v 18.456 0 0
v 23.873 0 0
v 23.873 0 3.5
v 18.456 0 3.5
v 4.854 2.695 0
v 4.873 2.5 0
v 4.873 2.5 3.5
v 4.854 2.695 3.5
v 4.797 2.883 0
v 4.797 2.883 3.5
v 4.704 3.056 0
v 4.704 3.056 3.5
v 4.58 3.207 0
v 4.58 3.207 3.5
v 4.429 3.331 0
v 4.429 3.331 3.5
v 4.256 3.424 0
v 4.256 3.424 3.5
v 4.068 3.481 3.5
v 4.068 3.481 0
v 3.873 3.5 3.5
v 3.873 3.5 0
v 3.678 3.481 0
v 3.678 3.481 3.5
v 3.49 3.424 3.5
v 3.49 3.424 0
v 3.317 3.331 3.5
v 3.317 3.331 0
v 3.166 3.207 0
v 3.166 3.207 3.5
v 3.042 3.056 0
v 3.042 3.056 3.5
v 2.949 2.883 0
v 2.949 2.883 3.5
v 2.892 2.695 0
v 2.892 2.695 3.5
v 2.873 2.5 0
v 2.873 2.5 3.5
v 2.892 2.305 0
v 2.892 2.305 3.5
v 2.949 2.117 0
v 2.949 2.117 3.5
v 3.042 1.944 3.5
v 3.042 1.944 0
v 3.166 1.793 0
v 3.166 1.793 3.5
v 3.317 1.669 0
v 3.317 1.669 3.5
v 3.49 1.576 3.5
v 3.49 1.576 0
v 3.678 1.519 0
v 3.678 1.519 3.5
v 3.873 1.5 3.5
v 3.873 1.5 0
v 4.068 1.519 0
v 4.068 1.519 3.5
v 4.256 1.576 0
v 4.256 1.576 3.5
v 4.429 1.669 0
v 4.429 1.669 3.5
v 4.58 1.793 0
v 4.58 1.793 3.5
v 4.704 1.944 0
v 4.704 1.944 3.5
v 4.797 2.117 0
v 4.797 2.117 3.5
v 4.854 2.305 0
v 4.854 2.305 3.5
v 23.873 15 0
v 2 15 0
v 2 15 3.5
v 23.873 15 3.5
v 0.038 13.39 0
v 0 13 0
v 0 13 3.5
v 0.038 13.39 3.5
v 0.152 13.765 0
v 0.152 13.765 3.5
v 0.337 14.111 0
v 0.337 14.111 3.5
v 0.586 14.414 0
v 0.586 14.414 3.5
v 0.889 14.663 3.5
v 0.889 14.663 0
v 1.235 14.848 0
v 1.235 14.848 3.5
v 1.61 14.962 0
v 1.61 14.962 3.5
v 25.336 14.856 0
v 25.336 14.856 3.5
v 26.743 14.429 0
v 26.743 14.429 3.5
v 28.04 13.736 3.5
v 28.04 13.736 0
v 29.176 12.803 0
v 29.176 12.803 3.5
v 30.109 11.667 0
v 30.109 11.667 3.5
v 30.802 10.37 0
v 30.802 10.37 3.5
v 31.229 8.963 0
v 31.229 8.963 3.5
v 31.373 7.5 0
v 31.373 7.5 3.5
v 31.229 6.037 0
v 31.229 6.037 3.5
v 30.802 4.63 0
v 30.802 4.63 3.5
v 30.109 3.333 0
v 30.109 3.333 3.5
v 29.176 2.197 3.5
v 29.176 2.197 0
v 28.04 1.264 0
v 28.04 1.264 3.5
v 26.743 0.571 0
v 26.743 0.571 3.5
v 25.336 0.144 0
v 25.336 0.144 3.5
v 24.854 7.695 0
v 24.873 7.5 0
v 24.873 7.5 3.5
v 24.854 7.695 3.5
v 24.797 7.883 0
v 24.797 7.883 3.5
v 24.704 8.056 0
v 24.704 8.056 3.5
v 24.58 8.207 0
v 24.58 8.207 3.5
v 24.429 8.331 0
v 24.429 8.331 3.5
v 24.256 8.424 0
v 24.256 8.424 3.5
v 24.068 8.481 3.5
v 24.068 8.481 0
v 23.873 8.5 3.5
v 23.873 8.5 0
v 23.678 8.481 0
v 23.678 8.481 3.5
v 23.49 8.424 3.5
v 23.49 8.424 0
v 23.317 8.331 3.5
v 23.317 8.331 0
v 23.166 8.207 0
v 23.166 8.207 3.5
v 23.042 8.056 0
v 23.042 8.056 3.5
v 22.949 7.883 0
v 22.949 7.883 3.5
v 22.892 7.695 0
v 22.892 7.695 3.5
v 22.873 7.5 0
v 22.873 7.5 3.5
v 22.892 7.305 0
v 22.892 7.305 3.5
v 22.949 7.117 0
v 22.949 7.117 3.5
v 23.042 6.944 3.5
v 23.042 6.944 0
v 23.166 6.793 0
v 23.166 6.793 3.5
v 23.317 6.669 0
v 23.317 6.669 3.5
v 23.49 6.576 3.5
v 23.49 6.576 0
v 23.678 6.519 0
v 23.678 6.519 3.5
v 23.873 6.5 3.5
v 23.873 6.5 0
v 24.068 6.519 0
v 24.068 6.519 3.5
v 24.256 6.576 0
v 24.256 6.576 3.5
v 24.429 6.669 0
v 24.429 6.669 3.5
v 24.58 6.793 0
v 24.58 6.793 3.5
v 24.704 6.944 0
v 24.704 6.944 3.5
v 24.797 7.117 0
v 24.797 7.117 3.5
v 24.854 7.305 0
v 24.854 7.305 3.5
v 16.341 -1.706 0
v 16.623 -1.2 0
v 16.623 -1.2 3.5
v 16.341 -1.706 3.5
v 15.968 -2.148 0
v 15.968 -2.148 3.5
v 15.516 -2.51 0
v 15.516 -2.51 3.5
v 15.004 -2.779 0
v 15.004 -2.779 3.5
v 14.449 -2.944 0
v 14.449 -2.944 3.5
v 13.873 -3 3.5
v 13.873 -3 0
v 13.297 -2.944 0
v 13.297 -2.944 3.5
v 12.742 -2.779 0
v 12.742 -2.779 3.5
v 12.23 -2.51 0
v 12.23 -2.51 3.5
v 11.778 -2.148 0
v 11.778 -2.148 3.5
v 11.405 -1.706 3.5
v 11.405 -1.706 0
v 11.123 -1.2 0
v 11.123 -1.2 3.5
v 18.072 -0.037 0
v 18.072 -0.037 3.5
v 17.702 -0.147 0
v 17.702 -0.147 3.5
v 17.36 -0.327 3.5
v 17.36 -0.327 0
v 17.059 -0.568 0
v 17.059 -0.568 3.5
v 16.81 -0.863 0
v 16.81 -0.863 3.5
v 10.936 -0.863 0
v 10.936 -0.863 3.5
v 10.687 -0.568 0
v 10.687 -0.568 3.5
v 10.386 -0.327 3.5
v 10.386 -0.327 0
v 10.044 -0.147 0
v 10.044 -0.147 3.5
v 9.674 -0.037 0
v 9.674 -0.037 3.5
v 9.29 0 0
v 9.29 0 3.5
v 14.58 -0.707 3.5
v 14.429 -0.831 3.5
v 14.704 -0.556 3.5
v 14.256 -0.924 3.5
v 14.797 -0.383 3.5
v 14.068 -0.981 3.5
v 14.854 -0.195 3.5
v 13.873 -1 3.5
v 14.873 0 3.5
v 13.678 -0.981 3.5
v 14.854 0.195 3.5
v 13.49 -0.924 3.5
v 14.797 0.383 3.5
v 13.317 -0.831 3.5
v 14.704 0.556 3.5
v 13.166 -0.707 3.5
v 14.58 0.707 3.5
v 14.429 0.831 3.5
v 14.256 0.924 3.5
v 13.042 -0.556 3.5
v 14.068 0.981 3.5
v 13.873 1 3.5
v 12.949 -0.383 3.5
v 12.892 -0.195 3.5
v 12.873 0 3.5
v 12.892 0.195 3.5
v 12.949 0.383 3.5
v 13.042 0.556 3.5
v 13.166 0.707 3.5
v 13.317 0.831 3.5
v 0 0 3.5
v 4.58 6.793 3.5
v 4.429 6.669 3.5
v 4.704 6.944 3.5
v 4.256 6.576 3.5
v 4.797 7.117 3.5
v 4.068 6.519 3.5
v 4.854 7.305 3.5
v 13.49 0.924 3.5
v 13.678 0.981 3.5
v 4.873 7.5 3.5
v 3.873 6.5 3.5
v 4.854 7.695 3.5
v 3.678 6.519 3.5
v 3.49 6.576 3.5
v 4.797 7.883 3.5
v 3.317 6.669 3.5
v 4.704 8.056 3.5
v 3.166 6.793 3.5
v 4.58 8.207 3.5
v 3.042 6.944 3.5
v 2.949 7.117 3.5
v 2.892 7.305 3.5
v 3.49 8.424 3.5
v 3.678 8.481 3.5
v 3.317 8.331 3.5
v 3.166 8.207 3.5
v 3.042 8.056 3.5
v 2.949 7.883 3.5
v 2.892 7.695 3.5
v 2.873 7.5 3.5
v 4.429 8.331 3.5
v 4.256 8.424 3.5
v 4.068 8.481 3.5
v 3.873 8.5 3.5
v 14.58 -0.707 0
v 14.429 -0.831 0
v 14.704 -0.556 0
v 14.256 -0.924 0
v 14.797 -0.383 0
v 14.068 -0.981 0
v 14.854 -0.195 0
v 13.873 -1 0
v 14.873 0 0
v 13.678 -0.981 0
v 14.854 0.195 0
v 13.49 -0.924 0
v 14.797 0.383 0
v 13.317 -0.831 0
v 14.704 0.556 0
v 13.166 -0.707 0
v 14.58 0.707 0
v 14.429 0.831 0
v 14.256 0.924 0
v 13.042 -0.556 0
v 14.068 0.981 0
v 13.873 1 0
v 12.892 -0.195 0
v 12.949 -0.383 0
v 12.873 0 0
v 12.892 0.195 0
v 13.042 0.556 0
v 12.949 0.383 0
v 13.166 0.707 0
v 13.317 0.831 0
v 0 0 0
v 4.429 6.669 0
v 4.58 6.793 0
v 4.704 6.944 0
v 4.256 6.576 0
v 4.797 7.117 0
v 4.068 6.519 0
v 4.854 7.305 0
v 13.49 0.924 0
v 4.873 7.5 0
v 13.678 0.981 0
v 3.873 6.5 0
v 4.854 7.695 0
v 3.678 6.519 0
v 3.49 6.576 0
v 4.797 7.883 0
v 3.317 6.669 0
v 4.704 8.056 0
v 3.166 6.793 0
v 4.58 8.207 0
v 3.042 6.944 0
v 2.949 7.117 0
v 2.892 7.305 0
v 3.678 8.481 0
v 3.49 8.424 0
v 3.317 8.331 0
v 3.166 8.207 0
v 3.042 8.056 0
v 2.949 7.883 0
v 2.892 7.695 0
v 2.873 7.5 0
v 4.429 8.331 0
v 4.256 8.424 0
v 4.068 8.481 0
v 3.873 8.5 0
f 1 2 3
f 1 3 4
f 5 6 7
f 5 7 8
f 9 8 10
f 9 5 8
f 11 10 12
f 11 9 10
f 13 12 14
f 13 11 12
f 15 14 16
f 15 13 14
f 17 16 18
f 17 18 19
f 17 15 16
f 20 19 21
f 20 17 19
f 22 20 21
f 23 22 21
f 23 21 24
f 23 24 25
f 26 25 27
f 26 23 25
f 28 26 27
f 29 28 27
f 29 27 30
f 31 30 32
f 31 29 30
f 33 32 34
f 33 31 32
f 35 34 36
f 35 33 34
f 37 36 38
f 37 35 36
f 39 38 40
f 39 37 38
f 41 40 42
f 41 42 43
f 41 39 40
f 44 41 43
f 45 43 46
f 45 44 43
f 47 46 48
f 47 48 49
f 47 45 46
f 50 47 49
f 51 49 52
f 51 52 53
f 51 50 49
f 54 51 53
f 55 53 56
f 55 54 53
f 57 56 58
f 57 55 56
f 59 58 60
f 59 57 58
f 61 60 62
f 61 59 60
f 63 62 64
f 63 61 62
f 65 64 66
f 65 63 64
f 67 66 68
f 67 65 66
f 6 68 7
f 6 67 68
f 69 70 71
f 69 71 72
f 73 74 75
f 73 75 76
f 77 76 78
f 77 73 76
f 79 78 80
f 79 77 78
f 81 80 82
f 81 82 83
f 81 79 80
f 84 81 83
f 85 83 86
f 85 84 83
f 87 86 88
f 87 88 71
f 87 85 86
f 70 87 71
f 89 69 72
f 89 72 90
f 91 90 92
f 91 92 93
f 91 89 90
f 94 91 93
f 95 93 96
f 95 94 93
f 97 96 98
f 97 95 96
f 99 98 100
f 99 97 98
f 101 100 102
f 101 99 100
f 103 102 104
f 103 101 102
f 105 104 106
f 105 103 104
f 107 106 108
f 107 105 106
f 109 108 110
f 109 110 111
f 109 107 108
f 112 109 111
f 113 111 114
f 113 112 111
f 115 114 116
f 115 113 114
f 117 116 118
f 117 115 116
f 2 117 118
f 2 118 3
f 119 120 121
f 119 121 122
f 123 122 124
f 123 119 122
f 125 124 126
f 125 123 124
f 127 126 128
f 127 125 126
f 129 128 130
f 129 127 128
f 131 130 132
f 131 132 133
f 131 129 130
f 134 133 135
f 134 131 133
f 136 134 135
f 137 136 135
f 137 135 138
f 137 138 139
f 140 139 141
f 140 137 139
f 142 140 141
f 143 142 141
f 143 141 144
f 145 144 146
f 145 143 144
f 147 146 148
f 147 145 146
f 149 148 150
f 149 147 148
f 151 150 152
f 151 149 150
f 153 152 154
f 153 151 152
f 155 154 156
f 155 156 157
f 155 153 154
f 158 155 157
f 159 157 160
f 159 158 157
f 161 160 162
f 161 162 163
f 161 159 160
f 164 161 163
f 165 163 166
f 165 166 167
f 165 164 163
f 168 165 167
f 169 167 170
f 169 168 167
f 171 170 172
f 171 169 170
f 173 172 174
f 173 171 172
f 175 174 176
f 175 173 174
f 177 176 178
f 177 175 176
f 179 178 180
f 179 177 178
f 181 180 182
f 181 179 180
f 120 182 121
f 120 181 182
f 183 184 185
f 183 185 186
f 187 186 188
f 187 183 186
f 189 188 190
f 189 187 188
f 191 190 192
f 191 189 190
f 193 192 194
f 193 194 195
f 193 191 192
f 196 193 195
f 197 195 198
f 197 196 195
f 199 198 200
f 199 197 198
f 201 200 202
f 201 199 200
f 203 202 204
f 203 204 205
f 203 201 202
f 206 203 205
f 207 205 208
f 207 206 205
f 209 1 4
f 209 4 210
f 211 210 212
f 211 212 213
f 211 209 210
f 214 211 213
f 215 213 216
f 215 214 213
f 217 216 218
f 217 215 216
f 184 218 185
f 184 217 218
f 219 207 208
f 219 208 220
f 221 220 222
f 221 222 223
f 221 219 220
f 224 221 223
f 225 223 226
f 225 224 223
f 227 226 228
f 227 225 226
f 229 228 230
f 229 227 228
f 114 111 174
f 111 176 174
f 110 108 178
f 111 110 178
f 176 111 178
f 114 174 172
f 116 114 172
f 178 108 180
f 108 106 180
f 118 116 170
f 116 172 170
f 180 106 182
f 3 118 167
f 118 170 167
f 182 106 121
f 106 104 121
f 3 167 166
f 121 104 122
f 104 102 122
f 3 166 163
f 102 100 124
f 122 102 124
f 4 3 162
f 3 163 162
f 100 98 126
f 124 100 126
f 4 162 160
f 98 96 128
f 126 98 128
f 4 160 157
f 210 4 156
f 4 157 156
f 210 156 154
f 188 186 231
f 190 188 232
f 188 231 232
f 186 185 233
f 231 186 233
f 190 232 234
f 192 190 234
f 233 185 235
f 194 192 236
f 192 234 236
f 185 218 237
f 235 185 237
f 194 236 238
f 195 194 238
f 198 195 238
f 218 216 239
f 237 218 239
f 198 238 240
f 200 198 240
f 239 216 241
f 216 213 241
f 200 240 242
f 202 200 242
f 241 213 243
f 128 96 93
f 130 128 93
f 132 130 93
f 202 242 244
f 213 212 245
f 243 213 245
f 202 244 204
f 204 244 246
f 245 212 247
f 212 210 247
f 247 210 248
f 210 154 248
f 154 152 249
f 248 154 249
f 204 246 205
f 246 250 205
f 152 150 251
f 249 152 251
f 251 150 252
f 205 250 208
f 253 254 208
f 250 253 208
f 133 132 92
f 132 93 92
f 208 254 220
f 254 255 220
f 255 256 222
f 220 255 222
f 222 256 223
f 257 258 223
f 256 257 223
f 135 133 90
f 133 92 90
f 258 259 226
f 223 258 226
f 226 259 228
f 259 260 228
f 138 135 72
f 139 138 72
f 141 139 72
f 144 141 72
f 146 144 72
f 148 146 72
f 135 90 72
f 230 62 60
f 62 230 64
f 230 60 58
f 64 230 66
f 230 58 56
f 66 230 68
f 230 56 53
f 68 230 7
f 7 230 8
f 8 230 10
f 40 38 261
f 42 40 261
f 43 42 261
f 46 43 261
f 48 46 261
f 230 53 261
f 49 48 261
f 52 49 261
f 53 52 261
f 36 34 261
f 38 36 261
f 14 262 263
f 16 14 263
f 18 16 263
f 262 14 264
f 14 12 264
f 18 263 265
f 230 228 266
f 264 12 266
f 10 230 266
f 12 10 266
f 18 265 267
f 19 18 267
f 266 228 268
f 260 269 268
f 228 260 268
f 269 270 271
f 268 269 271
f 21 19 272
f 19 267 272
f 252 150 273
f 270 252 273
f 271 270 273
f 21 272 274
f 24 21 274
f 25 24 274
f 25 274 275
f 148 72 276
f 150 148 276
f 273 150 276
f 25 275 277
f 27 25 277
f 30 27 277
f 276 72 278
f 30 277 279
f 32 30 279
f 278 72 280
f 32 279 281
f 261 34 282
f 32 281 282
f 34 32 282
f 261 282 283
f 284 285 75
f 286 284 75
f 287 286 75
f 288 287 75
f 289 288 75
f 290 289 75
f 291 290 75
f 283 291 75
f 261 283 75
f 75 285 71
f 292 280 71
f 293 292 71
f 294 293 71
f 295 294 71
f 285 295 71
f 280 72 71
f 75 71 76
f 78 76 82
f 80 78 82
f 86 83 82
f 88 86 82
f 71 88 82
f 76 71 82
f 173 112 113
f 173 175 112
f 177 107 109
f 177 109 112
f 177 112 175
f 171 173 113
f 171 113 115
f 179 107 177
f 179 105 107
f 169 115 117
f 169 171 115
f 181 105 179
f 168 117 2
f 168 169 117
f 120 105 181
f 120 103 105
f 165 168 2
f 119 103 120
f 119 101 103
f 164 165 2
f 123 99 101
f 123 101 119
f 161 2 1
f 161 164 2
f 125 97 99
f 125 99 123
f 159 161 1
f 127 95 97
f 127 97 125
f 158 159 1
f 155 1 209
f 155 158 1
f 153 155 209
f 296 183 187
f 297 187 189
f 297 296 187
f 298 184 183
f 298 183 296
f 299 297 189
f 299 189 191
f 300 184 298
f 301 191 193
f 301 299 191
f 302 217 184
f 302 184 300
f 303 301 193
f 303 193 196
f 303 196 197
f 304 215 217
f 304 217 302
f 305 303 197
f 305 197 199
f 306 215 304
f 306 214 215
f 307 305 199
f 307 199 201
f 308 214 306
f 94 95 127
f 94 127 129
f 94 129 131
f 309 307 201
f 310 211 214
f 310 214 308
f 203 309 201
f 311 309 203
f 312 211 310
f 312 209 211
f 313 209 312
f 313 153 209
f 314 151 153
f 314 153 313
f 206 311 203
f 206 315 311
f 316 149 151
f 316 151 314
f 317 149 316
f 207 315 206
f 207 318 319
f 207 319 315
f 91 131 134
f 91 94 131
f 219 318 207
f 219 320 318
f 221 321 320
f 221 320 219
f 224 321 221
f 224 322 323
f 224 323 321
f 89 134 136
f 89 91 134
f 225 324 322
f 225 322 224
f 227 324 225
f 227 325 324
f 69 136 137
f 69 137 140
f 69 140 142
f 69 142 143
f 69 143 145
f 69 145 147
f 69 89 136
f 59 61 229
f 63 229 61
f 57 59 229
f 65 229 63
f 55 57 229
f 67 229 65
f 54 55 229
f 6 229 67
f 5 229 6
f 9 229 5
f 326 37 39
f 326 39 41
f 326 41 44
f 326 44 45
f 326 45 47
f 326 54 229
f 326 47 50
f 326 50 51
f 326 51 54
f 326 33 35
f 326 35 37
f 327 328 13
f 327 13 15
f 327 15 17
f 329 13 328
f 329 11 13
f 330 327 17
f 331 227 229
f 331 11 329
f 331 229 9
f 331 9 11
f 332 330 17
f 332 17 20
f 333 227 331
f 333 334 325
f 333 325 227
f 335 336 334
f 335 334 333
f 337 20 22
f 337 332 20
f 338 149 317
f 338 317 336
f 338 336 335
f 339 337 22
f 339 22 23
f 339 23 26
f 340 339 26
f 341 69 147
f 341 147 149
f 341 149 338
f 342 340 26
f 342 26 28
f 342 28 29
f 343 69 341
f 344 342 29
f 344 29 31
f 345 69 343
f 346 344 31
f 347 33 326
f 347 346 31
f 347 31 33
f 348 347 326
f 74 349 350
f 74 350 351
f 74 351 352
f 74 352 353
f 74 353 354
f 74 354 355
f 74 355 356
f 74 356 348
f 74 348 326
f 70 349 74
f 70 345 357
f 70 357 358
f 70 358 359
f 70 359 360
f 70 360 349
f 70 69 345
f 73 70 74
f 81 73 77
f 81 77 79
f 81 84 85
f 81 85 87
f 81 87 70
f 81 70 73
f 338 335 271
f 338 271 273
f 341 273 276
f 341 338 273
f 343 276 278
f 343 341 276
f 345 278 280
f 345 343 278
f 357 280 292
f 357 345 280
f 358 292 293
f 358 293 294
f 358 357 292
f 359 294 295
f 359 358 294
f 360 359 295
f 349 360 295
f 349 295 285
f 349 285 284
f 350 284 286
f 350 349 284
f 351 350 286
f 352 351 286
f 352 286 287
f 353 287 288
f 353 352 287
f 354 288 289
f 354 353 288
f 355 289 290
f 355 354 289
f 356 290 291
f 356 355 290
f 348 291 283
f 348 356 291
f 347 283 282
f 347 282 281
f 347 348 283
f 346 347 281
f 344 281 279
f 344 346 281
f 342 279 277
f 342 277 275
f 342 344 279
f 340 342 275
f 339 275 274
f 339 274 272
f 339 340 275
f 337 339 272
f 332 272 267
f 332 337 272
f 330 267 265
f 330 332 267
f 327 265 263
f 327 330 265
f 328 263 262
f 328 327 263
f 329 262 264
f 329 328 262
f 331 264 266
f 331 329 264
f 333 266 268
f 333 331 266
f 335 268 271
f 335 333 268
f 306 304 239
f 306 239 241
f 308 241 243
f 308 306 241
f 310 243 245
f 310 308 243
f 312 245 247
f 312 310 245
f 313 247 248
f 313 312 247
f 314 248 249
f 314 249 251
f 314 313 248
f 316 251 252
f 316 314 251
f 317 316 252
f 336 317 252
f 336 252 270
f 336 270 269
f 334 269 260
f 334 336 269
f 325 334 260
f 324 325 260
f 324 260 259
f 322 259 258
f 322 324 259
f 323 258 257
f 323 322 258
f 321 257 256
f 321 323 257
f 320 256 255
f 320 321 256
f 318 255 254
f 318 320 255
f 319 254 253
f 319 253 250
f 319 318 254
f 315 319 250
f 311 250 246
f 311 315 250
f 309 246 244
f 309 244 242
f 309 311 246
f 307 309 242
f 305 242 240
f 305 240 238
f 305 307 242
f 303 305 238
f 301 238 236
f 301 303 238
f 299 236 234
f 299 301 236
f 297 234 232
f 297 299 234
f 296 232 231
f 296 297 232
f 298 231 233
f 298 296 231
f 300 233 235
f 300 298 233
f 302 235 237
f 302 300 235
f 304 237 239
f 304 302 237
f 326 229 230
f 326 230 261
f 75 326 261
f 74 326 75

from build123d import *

# Parameters (mm, degrees)
SKETCH1_R           = 1
BOSS_EXTRUDE1_DEPTH = 3.5


with BuildPart() as part:
    # Sketch1 → Boss-Extrude1 (new body)
    with BuildSketch(Plane.XY):
        with BuildLine():
            Line((0, 0), (0, 13))
            ThreePointArc((0, 13), (0.585786438, 14.414213562), (2, 15))
            Line((2, 15), (23.872983346, 15))
            ThreePointArc((23.872983346, 15), (31.372983346, 7.5), (23.872983346, 0))
            Line((23.872983346, 0), (18.455559041, 0))
            ThreePointArc((18.455559041, 0), (17.360113926, -0.326679947), (16.622528763, -1.2))
            ThreePointArc((16.622528763, -1.2), (13.872983346, -3), (11.123437929, -1.2))
            ThreePointArc((11.123437929, -1.2), (10.385852766, -0.326679947), (9.290407651, 0))
            Line((9.290407651, 0), (0, 0))
        make_face()
        with Locations((3.872983346, 7.5)):
            Circle(SKETCH1_R, mode=Mode.SUBTRACT)
        with Locations((23.872983346, 7.5)):
            Circle(SKETCH1_R, mode=Mode.SUBTRACT)
        with Locations((13.872983346, 0)):
            Circle(SKETCH1_R, mode=Mode.SUBTRACT)
        with Locations((3.872983346, 2.5)):
            Circle(SKETCH1_R, mode=Mode.SUBTRACT)
    extrude(amount=BOSS_EXTRUDE1_DEPTH)


solid = part.part
